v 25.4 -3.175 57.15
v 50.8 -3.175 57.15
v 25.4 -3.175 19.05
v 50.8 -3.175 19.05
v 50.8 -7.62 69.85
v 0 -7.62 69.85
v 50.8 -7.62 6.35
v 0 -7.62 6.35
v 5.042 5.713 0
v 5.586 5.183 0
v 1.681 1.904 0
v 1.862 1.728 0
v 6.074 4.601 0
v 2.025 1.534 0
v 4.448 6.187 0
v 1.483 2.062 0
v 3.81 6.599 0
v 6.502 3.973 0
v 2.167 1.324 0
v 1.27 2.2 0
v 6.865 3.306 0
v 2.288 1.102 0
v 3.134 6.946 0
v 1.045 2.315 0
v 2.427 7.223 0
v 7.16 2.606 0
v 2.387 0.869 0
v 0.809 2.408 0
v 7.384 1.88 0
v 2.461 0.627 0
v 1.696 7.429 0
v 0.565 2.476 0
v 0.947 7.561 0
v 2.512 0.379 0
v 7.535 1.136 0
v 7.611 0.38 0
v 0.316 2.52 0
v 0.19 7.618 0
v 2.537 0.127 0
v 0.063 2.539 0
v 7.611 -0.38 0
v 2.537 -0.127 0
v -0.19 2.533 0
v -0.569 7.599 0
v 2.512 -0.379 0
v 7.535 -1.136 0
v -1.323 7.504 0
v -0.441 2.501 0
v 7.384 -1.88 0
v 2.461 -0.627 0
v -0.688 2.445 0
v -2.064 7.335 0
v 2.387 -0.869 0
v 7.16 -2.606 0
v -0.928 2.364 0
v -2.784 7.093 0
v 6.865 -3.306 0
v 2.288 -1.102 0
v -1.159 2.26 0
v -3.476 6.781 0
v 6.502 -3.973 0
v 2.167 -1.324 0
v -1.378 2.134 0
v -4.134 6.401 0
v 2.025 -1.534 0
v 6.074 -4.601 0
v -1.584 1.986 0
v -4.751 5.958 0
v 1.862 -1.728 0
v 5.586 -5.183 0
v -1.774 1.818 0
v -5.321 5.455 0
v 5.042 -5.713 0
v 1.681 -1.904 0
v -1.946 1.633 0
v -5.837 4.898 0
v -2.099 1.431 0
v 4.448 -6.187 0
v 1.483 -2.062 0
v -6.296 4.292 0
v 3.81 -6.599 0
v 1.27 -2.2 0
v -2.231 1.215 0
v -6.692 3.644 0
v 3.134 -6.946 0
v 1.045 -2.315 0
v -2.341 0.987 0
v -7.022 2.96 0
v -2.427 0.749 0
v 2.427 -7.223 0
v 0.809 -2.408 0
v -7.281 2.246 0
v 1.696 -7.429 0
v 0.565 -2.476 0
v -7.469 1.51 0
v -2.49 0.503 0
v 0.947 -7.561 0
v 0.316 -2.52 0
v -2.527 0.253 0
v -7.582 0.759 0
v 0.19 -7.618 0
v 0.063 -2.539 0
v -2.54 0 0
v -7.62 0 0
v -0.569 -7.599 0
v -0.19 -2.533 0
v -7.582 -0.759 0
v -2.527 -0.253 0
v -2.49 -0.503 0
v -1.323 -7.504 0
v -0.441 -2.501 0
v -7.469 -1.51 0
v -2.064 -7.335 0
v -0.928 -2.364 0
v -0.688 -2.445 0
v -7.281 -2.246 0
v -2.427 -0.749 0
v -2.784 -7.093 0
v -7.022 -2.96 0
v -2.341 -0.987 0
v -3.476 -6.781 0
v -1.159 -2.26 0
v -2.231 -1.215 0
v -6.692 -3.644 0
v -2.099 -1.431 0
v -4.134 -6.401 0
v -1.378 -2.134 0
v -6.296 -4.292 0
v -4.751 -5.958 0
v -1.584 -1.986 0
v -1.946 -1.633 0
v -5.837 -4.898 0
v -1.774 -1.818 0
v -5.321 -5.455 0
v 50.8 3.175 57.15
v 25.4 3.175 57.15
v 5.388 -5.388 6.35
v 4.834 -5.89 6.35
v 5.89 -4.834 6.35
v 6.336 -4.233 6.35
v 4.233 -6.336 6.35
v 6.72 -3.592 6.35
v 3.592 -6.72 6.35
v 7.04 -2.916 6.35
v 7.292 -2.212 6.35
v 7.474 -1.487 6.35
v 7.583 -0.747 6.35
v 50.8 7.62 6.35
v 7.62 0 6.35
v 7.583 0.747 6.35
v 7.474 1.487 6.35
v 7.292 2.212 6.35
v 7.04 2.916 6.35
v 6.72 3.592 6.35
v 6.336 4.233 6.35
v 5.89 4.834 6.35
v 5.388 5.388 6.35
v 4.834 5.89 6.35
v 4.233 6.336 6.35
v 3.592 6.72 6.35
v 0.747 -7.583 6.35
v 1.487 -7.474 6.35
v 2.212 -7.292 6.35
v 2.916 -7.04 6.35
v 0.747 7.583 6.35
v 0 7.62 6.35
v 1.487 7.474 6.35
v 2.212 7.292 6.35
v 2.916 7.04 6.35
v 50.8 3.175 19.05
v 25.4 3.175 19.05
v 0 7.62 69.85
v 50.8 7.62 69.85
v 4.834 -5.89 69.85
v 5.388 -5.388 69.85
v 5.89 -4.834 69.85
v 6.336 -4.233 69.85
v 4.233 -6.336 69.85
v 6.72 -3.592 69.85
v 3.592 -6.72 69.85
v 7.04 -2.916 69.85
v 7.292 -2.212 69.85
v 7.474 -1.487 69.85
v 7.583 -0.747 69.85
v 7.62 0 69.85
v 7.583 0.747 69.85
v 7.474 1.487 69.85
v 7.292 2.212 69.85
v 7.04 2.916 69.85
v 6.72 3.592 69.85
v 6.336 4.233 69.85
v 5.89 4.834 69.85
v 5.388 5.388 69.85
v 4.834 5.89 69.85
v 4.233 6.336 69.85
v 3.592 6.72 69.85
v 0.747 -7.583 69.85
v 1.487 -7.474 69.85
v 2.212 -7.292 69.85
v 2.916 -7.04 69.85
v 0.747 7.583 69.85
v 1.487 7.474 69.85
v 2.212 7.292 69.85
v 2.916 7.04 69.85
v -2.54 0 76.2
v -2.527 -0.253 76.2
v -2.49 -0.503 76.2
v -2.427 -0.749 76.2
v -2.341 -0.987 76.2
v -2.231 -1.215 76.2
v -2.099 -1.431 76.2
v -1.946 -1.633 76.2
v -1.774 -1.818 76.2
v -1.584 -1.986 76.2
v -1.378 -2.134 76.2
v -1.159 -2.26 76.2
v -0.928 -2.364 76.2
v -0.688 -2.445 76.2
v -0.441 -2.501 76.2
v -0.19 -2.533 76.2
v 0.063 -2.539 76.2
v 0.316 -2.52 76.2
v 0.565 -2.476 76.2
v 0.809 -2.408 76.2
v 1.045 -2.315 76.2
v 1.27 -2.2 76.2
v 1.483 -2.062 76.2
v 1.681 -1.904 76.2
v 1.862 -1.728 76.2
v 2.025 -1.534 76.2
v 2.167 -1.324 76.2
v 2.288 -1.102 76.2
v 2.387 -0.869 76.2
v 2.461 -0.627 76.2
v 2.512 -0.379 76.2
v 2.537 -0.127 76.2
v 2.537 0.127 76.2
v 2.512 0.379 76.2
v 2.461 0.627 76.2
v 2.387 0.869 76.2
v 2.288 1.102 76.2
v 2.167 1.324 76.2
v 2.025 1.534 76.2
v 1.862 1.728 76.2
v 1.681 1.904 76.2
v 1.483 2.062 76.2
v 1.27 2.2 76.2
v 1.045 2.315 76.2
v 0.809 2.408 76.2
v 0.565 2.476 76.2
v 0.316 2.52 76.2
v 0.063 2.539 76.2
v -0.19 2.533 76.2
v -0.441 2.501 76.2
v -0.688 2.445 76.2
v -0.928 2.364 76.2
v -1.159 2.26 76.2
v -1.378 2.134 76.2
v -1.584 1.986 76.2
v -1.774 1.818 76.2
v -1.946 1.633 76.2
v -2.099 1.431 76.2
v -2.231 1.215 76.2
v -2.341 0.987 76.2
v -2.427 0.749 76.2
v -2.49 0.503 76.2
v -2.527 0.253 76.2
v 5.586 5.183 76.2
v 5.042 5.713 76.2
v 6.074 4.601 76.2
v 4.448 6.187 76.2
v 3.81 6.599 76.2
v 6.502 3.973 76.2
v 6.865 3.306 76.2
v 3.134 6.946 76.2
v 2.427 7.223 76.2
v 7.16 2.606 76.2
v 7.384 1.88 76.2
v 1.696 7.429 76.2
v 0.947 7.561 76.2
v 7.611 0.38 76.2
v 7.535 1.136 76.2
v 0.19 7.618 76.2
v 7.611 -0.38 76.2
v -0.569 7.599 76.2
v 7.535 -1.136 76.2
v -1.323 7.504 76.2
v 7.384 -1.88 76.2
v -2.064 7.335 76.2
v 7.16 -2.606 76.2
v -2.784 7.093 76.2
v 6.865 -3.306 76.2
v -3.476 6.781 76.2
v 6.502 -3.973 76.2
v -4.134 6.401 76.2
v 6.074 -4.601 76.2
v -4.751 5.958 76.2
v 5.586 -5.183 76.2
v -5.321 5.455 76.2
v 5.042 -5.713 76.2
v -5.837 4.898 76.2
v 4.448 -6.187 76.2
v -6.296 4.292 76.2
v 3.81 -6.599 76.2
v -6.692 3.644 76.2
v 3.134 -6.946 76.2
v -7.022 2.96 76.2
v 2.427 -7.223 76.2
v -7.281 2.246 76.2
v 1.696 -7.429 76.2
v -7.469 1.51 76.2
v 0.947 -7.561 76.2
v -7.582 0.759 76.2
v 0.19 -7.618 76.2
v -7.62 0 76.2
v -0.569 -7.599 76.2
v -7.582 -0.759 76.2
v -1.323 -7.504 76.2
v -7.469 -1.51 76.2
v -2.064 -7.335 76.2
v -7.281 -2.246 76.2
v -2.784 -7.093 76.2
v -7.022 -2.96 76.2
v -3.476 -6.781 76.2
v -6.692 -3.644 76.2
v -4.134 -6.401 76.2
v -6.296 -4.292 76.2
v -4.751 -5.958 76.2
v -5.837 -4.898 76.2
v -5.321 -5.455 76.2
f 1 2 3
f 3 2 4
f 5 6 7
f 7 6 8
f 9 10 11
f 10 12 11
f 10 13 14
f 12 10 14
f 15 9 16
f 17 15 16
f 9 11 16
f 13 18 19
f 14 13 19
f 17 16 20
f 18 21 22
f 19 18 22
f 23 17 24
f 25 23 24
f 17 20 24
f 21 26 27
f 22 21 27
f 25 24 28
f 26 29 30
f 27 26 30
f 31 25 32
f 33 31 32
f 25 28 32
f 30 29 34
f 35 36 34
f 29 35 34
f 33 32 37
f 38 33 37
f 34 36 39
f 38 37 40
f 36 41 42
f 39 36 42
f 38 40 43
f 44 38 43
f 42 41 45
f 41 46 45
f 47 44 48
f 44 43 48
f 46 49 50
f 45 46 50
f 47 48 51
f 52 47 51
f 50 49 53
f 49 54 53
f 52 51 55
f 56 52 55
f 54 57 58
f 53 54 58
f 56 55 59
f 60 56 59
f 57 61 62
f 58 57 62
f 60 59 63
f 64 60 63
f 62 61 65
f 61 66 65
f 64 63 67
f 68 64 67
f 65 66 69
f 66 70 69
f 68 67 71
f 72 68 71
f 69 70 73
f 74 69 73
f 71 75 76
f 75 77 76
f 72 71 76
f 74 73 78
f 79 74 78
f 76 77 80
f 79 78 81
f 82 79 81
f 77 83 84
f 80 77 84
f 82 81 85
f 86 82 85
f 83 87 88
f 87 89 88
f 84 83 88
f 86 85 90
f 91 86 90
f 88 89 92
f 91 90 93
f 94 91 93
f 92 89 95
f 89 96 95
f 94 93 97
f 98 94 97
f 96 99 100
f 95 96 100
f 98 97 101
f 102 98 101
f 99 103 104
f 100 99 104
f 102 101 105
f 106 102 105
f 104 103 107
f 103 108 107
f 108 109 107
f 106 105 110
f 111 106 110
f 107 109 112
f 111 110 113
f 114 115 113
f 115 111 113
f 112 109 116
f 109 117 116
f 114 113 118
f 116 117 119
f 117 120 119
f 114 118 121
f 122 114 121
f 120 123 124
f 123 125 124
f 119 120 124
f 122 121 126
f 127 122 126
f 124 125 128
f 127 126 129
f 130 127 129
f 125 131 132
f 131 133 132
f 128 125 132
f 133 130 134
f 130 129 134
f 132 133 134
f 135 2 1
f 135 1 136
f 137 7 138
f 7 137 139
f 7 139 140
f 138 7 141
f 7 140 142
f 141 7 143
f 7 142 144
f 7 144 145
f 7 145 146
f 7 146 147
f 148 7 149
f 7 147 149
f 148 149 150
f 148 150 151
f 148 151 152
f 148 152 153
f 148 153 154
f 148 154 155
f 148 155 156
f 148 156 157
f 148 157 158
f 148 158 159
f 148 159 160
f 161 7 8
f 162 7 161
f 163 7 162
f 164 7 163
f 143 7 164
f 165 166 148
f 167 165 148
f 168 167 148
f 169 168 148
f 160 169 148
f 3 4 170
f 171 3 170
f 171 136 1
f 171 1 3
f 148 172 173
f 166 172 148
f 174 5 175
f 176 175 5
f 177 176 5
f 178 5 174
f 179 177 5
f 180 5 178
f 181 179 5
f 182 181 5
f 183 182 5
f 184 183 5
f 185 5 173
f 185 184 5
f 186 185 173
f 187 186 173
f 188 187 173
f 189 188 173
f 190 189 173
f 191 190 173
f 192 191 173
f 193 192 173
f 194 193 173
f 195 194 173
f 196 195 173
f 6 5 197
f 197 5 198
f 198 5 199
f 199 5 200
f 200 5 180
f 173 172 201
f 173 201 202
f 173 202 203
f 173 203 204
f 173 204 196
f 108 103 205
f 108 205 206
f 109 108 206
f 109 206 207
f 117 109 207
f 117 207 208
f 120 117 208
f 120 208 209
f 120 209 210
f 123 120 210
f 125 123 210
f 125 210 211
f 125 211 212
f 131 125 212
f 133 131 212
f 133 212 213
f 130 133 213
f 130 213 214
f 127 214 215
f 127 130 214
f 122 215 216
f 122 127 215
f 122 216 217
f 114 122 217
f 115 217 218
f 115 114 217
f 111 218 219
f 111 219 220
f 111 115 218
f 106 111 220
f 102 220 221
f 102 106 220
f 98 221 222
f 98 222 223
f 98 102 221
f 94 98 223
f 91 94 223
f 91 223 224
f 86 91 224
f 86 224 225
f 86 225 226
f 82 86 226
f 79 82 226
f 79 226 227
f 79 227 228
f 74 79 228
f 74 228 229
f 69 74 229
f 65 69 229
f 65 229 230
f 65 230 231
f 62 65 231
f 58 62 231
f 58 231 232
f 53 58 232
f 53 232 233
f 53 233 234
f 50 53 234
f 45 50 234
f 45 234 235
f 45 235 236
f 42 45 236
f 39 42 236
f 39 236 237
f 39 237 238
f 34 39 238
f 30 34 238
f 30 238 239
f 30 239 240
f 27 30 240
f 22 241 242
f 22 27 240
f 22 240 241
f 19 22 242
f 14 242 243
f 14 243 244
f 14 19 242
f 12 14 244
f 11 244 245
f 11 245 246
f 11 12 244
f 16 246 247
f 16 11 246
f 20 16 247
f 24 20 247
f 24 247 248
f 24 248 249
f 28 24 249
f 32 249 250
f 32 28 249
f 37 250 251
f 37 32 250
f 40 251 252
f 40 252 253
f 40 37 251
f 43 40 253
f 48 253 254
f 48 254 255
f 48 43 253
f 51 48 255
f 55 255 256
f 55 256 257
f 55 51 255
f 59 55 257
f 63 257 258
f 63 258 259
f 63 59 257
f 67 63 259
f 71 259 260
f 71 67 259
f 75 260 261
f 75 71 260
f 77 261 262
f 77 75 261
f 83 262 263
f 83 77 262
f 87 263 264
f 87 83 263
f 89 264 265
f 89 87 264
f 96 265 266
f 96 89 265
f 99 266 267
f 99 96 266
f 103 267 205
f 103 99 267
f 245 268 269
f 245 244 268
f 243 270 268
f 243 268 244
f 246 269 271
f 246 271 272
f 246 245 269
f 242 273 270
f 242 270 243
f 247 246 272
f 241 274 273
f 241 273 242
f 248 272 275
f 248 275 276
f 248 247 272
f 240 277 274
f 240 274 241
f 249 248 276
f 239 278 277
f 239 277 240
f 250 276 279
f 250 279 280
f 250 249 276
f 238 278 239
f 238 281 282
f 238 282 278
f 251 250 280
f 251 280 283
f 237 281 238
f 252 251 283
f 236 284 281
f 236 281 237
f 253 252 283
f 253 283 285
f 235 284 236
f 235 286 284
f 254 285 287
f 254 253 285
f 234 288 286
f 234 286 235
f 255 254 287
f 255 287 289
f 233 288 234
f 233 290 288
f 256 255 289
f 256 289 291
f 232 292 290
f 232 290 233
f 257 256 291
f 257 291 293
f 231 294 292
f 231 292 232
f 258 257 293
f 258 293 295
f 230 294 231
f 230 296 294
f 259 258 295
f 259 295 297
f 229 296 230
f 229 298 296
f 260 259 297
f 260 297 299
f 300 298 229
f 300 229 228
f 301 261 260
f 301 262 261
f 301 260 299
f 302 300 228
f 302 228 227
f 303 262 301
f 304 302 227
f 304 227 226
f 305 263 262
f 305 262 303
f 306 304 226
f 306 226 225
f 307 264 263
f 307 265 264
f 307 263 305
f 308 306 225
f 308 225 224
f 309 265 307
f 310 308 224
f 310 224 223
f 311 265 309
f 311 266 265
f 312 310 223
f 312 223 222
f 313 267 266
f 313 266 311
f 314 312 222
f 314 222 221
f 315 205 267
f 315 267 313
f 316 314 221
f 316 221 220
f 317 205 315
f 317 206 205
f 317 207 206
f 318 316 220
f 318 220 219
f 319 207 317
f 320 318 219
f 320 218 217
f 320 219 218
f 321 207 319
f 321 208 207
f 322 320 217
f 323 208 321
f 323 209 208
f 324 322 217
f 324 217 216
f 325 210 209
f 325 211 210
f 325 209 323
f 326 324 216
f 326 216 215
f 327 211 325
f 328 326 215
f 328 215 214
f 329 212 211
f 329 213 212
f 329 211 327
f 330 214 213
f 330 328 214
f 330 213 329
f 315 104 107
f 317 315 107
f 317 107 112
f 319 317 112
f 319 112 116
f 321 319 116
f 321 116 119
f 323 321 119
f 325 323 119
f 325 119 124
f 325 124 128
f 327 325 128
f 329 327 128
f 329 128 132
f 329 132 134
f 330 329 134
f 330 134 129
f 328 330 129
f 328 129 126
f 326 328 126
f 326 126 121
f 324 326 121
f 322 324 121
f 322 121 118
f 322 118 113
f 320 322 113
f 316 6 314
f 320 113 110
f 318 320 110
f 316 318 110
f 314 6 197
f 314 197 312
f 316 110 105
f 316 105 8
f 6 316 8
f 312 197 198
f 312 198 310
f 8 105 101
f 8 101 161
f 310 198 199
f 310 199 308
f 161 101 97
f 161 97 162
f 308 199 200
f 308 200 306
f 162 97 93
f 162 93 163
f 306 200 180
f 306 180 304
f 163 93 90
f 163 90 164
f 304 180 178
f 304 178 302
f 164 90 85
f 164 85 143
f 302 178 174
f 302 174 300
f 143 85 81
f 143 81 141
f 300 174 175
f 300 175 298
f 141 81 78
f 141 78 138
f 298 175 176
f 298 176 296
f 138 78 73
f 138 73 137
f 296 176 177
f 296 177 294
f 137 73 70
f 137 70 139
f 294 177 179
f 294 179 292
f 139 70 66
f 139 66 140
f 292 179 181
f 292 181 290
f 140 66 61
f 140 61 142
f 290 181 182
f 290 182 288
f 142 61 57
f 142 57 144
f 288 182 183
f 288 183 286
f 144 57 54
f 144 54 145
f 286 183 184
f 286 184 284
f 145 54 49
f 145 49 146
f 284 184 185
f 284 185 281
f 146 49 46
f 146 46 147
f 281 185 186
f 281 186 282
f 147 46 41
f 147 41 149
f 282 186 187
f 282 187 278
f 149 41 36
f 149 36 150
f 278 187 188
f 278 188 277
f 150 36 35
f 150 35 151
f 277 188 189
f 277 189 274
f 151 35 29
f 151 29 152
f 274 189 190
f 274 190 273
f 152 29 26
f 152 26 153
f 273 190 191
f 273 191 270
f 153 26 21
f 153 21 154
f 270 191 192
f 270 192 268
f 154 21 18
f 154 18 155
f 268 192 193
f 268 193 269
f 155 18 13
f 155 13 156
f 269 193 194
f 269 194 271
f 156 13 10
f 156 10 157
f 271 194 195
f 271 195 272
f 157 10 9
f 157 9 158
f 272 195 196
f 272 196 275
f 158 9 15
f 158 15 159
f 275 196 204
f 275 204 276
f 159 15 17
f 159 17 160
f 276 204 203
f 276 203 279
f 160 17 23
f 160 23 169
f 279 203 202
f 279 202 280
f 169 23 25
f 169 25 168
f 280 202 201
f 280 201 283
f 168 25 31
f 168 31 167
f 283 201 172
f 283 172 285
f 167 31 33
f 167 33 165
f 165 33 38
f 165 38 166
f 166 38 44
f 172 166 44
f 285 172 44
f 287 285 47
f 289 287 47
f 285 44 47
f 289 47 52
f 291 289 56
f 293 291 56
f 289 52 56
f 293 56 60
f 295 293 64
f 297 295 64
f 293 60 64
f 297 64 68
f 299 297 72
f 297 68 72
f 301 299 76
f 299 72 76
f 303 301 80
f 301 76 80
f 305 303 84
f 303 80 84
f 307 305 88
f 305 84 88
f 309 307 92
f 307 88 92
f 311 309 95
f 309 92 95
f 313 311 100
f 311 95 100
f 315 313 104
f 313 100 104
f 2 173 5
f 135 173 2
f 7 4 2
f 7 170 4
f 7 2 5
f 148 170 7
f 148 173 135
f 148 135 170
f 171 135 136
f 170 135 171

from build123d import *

# Parameters (mm, degrees)
SKETCH4_R               = 7.62
SKETCH4_R_2             = 2.54
BOSS_EXTRUDE1_DEPTH     = 76.2
SKETCH5_W               = 63.5
SKETCH5_H               = 15.24
BOSS_EXTRUDE2_DEPTH     = 50.8
SKETCH6_W               = 38.1
SKETCH6_H               = 6.35
CUT_EXTRUDE1_DEPTH      = 25.4
CUT_EXTRUDE2_DEPTH      = 92.897466777
CUT_EXTRUDE2_DEPTH_BACK = 92.897466777
SKETCH7_R               = 2.54


with BuildPart() as part:
    # Sketch4 → Boss-Extrude1 (new body)
    with BuildSketch(Plane.XY):
        with Locations(Location((0, 0, 0), (0, 0, 180))):
            Circle(SKETCH4_R)
        with Locations(Location((0, 0, 0), (0, 0, 180))):
            Circle(SKETCH4_R_2, mode=Mode.SUBTRACT)
    extrude(amount=BOSS_EXTRUDE1_DEPTH)

    # Sketch5 → Boss-Extrude2 (add)
    with BuildSketch(Plane(origin=(0, 0, 0), x_dir=(0, 0, -1), z_dir=(1, 0, 0))):
        with Locations((-38.1, 0)):
            Rectangle(SKETCH5_W, SKETCH5_H)
    extrude(amount=BOSS_EXTRUDE2_DEPTH)

    # Sketch6 → Cut-Extrude1 (cut)
    with BuildSketch(Plane(origin=(50.8, 0, 0), x_dir=(0, 0, -1), z_dir=(1, 0, 0))):
        with Locations((-38.1, 0)):
            Rectangle(SKETCH6_W, SKETCH6_H)
    extrude(amount=-CUT_EXTRUDE1_DEPTH, mode=Mode.SUBTRACT)

    # Sketch7 → Cut-Extrude2 (cut, two sides: drawn at the far end of the back side and taken through both)
    with BuildSketch(Plane.XY.offset(-CUT_EXTRUDE2_DEPTH_BACK)):
        with Locations(Location((0, 0, 0), (0, 0, 180))):
            Circle(SKETCH7_R)
    extrude(amount=CUT_EXTRUDE2_DEPTH + CUT_EXTRUDE2_DEPTH_BACK, mode=Mode.SUBTRACT)


solid = part.part
